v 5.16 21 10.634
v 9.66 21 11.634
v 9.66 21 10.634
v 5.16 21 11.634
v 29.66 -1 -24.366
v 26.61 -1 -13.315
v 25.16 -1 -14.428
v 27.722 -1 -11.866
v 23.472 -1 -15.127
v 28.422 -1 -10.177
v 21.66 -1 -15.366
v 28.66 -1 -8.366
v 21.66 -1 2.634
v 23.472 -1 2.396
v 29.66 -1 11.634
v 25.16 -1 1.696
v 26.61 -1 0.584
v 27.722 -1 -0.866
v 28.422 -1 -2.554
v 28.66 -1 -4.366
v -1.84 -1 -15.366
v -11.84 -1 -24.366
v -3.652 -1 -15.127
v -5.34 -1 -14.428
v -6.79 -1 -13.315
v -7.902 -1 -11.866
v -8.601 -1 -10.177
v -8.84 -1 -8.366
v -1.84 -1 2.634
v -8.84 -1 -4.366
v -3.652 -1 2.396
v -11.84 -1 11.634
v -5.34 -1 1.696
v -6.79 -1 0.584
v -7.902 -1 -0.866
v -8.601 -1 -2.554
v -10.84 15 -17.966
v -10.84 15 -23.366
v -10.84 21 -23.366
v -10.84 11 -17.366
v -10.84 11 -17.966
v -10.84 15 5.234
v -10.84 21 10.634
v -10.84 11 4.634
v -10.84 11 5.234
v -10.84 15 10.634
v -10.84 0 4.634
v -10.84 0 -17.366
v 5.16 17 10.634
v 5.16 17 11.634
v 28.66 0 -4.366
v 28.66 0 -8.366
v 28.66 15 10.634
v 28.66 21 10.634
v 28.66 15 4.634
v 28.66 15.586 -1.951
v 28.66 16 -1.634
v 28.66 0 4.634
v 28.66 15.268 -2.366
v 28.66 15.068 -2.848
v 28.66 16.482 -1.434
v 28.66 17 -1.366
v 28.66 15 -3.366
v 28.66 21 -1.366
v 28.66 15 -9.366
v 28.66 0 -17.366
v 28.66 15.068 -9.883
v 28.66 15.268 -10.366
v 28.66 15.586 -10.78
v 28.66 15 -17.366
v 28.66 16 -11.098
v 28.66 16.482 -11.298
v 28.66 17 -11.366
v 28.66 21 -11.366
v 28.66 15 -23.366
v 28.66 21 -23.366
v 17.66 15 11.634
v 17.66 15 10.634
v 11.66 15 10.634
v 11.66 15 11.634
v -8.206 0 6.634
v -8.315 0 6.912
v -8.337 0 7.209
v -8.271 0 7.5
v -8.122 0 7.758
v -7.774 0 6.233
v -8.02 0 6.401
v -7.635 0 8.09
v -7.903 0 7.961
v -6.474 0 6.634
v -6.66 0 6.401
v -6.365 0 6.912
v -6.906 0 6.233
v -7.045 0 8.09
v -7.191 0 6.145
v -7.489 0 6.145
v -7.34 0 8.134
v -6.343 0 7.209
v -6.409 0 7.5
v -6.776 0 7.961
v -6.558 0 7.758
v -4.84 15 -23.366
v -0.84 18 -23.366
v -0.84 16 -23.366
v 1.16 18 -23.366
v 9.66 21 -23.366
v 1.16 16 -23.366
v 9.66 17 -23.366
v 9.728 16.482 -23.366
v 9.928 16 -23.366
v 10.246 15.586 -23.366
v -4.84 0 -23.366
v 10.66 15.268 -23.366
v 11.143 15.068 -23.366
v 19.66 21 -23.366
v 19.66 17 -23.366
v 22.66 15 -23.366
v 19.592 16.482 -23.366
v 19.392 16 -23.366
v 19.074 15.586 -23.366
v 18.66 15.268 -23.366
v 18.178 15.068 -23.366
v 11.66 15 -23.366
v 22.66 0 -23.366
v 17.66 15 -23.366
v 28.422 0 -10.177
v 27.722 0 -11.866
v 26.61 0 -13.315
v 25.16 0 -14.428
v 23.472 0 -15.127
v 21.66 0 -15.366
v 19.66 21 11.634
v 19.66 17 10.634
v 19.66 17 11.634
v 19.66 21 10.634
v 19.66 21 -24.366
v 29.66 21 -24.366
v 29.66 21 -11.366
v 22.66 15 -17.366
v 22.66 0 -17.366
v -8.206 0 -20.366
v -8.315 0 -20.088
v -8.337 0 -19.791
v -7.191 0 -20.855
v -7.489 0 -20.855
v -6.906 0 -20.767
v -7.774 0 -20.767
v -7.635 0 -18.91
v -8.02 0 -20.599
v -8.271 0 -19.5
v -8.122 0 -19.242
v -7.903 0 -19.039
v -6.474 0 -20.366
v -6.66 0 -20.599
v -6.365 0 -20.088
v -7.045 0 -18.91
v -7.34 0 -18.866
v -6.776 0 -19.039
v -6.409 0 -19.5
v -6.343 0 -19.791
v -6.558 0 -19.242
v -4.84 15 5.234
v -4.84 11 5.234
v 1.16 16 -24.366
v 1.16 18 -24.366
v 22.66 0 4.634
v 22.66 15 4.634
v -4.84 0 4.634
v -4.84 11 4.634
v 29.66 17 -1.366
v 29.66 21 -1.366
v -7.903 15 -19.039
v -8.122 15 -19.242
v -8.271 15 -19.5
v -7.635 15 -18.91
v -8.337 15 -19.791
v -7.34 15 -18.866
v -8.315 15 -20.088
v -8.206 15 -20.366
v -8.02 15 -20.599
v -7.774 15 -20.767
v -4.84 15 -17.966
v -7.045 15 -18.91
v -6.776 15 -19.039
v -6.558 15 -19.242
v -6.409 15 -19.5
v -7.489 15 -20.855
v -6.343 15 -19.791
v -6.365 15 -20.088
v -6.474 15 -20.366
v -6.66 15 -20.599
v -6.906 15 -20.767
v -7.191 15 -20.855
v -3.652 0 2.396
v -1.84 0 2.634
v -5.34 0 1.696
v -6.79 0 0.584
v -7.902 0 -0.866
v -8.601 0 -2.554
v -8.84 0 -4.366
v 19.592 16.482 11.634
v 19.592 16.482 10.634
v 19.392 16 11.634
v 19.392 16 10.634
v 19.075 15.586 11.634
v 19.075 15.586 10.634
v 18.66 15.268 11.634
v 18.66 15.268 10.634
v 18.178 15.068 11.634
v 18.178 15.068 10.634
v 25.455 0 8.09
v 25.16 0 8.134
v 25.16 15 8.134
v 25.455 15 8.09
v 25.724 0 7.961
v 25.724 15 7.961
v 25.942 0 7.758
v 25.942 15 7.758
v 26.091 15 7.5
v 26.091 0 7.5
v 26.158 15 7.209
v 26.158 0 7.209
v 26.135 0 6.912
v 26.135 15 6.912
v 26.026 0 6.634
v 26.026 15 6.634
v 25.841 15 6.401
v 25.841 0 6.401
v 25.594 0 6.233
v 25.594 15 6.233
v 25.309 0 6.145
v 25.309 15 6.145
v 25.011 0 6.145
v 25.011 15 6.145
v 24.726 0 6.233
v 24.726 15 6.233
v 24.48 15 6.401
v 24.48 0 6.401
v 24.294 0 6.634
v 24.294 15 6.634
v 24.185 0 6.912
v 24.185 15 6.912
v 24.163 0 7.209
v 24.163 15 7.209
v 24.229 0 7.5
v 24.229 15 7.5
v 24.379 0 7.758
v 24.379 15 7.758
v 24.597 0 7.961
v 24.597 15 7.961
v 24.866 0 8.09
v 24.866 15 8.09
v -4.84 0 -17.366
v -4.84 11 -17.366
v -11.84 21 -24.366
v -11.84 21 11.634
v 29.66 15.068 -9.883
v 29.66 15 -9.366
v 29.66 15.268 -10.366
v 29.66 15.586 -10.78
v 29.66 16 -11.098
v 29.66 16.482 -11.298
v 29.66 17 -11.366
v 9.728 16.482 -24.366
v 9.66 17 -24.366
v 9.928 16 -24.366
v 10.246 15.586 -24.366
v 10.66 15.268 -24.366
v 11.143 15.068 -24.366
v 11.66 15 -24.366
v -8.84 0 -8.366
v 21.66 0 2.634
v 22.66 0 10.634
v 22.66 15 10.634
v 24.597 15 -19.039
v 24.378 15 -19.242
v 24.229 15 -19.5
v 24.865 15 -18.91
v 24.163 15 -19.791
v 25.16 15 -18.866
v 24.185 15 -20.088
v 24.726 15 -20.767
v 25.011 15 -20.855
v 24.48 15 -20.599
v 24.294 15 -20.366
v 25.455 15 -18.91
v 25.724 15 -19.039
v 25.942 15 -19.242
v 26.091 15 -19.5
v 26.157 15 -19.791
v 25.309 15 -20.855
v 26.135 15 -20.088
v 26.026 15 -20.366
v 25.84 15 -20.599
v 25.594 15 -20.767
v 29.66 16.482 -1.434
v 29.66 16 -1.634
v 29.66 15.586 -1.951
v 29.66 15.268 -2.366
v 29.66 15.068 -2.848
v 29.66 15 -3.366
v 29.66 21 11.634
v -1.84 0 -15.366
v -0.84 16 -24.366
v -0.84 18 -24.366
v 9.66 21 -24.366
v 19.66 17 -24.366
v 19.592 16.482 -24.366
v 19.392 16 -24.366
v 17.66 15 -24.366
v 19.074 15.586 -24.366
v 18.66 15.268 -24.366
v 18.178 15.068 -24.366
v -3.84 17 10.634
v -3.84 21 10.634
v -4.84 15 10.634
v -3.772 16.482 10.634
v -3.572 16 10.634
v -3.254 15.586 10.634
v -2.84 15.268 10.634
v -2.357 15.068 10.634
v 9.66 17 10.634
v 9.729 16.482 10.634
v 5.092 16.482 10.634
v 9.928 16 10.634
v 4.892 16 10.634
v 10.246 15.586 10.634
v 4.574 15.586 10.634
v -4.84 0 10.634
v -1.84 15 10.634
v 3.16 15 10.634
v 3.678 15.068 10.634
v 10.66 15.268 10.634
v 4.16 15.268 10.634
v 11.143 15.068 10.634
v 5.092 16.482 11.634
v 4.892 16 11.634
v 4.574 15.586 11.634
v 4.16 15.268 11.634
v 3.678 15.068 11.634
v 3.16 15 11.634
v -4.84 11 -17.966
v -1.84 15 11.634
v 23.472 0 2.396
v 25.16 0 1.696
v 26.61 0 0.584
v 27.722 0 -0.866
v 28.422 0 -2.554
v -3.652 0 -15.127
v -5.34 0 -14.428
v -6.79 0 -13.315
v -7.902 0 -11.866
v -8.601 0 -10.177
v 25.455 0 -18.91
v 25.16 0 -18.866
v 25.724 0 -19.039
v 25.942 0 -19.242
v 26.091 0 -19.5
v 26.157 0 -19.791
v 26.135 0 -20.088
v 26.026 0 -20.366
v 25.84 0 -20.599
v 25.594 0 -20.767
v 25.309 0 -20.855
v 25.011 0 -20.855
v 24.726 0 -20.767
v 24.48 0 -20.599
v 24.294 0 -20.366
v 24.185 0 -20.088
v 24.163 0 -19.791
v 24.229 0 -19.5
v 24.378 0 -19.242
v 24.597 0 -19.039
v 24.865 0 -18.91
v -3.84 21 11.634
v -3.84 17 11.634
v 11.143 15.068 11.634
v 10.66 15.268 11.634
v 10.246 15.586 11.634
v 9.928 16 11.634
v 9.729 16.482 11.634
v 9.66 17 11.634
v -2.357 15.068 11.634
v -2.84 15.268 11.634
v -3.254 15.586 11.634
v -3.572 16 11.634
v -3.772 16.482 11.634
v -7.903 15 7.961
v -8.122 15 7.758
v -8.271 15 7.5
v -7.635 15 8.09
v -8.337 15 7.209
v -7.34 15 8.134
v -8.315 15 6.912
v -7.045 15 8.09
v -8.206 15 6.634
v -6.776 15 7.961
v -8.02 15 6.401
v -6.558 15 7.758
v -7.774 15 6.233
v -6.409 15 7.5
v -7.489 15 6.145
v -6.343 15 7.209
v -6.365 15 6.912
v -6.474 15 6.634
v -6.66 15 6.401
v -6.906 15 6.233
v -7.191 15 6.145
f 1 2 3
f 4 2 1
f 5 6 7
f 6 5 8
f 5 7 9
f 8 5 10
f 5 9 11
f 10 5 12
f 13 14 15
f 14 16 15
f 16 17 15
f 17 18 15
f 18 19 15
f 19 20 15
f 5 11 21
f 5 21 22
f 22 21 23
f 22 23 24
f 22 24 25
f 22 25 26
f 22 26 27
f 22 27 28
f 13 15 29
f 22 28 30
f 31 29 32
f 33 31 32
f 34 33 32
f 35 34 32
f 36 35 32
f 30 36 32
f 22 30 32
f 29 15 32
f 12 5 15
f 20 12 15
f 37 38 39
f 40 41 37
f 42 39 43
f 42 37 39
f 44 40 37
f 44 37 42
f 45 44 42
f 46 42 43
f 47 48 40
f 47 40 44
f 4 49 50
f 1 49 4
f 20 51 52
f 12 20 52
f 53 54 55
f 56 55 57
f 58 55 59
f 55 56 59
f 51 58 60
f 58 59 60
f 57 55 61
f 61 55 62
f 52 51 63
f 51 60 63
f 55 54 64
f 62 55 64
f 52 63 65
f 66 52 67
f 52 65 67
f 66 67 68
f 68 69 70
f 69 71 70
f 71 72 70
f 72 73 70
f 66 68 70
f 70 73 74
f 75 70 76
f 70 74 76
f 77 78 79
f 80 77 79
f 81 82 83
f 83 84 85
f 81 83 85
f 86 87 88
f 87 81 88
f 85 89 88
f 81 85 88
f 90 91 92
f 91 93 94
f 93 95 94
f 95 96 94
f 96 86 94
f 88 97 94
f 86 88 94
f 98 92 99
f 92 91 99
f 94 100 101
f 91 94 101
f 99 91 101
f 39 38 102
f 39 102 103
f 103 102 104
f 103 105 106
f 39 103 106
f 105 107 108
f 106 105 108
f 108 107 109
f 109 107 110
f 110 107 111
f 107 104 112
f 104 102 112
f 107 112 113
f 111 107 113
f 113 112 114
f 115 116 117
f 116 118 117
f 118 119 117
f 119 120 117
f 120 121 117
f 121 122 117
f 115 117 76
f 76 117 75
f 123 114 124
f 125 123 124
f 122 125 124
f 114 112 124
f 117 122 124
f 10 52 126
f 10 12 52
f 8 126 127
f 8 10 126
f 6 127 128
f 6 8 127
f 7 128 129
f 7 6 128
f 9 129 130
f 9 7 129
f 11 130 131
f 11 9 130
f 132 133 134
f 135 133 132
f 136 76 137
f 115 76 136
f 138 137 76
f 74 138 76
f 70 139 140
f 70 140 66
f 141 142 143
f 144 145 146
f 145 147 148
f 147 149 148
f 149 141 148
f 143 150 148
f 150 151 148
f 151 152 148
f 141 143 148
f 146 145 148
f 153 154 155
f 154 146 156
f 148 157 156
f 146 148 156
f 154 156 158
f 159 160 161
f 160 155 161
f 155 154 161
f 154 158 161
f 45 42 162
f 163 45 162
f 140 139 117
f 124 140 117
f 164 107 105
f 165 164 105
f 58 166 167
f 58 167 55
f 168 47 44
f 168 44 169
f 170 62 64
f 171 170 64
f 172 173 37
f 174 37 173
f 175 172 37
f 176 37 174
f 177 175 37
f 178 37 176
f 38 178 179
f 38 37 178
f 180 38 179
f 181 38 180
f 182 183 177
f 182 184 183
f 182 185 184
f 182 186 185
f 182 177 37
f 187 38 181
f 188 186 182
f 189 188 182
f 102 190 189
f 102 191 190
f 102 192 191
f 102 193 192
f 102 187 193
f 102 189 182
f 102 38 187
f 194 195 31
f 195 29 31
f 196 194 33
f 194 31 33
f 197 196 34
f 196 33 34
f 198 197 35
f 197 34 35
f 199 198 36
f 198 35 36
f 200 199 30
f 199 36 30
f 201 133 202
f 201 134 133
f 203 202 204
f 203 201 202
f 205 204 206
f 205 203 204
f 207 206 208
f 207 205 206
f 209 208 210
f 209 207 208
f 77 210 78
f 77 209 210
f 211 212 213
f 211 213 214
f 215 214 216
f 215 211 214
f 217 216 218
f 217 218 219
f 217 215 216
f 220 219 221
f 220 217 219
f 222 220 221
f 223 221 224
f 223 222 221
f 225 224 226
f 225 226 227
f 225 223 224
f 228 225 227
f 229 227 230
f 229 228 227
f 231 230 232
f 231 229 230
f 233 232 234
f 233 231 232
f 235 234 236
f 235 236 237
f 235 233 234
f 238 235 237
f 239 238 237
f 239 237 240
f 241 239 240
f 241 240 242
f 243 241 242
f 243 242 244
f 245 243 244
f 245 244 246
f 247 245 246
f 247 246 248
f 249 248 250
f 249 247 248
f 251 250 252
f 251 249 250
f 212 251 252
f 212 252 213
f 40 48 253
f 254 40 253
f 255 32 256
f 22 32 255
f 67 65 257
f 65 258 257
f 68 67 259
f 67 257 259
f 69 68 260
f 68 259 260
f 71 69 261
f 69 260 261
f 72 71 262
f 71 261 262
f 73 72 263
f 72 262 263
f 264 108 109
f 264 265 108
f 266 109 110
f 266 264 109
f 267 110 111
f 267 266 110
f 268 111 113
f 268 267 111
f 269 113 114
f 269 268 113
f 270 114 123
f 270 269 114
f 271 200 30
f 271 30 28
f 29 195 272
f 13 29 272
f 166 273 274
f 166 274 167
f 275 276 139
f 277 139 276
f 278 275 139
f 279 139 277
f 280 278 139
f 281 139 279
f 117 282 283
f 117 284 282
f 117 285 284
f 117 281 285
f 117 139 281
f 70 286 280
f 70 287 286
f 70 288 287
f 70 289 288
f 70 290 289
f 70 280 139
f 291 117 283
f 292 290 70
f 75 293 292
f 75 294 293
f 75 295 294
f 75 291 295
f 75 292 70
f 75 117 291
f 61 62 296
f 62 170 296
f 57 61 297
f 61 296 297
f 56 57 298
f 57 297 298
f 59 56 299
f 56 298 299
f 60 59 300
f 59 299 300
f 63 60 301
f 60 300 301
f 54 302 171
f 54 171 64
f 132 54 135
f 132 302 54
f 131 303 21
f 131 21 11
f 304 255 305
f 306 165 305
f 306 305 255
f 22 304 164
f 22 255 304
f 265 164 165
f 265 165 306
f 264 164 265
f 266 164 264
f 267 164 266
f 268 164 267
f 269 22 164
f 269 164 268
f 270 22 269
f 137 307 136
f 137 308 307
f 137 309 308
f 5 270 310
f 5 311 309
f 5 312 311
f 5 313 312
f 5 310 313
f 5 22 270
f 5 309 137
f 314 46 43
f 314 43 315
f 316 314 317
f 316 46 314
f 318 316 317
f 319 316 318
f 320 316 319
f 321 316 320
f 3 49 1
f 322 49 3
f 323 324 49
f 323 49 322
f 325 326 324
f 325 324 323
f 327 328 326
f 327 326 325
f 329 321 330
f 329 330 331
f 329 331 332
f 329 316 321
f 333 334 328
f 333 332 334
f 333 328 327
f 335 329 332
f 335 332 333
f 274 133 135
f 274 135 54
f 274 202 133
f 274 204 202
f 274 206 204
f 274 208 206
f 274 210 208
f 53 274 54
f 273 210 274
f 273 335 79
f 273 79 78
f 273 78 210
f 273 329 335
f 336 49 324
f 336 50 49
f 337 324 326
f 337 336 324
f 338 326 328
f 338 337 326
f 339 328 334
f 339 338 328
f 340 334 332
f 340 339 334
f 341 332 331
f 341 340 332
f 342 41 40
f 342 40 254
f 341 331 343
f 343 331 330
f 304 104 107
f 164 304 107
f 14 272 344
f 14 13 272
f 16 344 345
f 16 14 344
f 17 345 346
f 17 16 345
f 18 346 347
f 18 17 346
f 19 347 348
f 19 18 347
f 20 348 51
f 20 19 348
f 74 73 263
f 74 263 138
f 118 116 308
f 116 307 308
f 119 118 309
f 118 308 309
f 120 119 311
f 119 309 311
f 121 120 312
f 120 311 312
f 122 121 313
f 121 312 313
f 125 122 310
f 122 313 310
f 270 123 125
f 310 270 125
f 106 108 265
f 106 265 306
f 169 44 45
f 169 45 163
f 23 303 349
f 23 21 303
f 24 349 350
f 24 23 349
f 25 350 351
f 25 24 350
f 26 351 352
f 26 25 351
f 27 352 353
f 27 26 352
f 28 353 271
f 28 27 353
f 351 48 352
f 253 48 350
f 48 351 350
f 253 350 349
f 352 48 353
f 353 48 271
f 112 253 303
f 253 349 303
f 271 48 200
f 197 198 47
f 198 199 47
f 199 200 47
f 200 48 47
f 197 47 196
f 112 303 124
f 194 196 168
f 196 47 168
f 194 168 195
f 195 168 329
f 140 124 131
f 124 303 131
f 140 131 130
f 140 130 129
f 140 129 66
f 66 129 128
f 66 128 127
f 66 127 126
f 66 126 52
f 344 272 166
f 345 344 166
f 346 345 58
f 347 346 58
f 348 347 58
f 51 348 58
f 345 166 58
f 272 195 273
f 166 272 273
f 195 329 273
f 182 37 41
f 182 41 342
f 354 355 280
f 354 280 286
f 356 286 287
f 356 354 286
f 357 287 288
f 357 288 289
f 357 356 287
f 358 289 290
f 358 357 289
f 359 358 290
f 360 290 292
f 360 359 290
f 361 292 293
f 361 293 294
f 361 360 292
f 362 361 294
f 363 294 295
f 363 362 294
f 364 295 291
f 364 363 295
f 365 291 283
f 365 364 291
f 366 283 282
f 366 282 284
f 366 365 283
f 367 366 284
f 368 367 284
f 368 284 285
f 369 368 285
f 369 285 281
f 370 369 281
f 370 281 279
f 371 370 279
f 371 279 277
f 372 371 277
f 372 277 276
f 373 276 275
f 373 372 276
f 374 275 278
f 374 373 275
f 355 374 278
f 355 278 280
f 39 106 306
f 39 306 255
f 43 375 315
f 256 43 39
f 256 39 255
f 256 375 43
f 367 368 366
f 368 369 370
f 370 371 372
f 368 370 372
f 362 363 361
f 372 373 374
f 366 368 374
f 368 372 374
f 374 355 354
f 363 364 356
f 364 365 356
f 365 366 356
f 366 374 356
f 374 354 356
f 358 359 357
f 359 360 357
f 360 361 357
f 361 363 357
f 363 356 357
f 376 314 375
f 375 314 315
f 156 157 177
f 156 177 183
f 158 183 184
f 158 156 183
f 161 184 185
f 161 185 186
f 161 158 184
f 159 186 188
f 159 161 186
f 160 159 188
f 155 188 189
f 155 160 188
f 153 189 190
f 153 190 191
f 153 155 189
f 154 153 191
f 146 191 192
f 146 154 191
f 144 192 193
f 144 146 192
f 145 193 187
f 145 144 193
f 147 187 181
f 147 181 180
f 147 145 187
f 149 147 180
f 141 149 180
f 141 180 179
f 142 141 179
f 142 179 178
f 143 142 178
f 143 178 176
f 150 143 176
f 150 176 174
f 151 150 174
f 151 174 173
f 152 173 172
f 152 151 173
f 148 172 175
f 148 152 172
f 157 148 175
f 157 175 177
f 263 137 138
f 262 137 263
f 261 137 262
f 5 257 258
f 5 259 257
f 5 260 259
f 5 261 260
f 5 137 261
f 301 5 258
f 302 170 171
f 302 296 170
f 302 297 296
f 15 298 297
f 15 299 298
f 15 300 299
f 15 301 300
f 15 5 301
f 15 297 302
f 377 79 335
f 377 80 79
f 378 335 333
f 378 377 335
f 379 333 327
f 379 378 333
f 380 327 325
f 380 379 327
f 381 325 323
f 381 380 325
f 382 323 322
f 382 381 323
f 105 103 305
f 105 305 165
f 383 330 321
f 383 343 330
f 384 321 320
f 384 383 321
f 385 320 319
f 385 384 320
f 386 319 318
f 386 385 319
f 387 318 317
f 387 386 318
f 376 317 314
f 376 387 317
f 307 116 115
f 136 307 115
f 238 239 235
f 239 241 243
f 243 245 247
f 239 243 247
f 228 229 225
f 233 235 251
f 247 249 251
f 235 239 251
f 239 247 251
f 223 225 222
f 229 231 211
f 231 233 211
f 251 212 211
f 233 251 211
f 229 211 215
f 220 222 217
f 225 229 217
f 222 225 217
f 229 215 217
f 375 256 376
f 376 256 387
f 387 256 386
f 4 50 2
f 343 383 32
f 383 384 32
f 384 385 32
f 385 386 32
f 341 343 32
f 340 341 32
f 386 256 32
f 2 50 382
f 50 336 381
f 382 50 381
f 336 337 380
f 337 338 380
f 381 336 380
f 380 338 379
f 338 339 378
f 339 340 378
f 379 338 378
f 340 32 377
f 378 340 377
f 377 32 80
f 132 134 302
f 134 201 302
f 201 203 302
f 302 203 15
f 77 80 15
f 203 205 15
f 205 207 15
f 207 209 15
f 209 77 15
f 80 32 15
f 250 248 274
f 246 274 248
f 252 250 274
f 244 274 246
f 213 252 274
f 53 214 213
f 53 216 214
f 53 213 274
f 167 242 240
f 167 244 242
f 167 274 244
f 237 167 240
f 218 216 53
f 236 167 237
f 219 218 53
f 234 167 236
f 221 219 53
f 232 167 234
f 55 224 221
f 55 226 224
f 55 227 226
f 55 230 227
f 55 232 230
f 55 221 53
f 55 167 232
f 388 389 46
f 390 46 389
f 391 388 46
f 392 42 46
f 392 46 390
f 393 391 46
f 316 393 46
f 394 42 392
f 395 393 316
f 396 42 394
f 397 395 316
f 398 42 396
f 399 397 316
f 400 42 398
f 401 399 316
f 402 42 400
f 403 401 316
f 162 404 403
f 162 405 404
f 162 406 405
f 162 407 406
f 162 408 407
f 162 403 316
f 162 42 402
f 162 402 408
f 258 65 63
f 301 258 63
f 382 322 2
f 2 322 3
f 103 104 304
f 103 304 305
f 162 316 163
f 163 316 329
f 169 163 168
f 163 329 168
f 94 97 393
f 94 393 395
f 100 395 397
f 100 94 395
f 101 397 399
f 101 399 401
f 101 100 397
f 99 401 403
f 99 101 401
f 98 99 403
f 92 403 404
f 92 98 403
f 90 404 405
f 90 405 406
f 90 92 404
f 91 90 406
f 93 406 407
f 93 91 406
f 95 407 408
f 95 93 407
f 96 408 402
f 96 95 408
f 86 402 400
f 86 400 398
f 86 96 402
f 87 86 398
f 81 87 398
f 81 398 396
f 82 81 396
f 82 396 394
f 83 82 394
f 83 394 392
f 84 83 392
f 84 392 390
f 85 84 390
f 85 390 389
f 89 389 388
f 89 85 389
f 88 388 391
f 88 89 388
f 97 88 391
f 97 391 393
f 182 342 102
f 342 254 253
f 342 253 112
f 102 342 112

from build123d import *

# Parameters (mm, degrees)
SKETCH1_W             = 6
SKETCH1_H             = 6
SKETCH1_R             = 1
BOSS_EXTRUDE1_DEPTH   = 15
BOSS_EXTRUDE1_2_DEPTH = 15
BOSS_EXTRUDE1_3_DEPTH = 15
BOSS_EXTRUDE1_4_DEPTH = 15
SKETCH2_W             = 39.5
SKETCH2_H             = 33.999999999
BOSS_EXTRUDE2_DEPTH   = 1
SKETCH3_W             = 39.5
SKETCH3_H             = 33.999999999
BOSS_EXTRUDE3_DEPTH   = 22
SKETCH4_W             = 37.5
SKETCH4_H             = 17.999999999
CUT_EXTRUDE1_DEPTH    = 22
FILLET1_R             = 7
SKETCH7_W             = 6
SKETCH7_H             = 0.6
CUT_EXTRUDE2_DEPTH    = 4
SKETCH8_W             = 9.999999999
SKETCH8_H             = 6
CUT_EXTRUDE3_DEPTH    = 4
FILLET2_R             = 2
SKETCH9_W             = 10
SKETCH9_H             = 6
SKETCH9_W_2           = 9
CUT_EXTRUDE4_DEPTH    = 4
FILLET3_R             = 2
SKETCH10_W            = 10
SKETCH10_H            = 6
CUT_EXTRUDE5_DEPTH    = 4
FILLET4_R             = 2
SKETCH11_W            = 2
SKETCH11_H            = 2
CUT_EXTRUDE6_DEPTH    = 4


with BuildPart() as part:
    # Sketch1 → Boss-Extrude1 (new body)
    with BuildSketch(Plane(origin=(0, 0, 0), x_dir=(1, 0, 0), z_dir=(0, 1, 0))):
        with Locations((-7.839776389, 20.365683815)):
            Rectangle(SKETCH1_W, SKETCH1_H)
        with Locations(Location((-7.339776389, 19.865683815, 0), (0, 0, 270))):
            Circle(SKETCH1_R, mode=Mode.SUBTRACT)
    extrude(amount=BOSS_EXTRUDE1_DEPTH)



with BuildPart() as body_2:
    # Sketch1 → Boss-Extrude1 2 (new body)
    with BuildSketch(Plane(origin=(0, 0, 0), x_dir=(1, 0, 0), z_dir=(0, 1, 0))):
        with Locations((25.660223611, 20.365683814)):
            Rectangle(SKETCH1_W, SKETCH1_H)
        with Locations(Location((25.160223611, 19.865683814, 0), (0, 0, 270))):
            Circle(SKETCH1_R, mode=Mode.SUBTRACT)
    extrude(amount=BOSS_EXTRUDE1_2_DEPTH)


with BuildPart() as body_3:
    # Sketch1 → Boss-Extrude1 3 (new body)
    with BuildSketch(Plane(origin=(0, 0, 0), x_dir=(1, 0, 0), z_dir=(0, 1, 0))):
        with Locations((-7.839776389, -7.634316185)):
            Rectangle(SKETCH1_W, SKETCH1_H)
        with Locations(Location((-7.339776389, -7.134316185, 0), (0, 0, 270))):
            Circle(SKETCH1_R, mode=Mode.SUBTRACT)
    extrude(amount=BOSS_EXTRUDE1_3_DEPTH)


with BuildPart() as body_4:
    # Sketch1 → Boss-Extrude1 4 (new body)
    with BuildSketch(Plane(origin=(0, 0, 0), x_dir=(1, 0, 0), z_dir=(0, 1, 0))):
        with Locations((25.660371549, -7.634316185)):
            Rectangle(SKETCH1_W, SKETCH1_H)
        with Locations(Location((25.160371549, -7.134316185, 0), (0, 0, 270))):
            Circle(SKETCH1_R, mode=Mode.SUBTRACT)
    extrude(amount=BOSS_EXTRUDE1_4_DEPTH)


with BuildPart() as part_1:
    add(part.part)

    add(body_2.part)  # Boss-Extrude2 merges body 2

    add(body_3.part)  # Boss-Extrude2 merges body 3

    add(body_4.part)  # Boss-Extrude2 merges body 4
    # Sketch2 → Boss-Extrude2 (add)
    with BuildSketch(Plane.XZ):
        with Locations((8.910223611, -6.365683814)):
            Rectangle(SKETCH2_W, SKETCH2_H)
    extrude(amount=BOSS_EXTRUDE2_DEPTH)

    # Sketch3 → Boss-Extrude3 (add)
    with BuildSketch(Plane.XZ.offset(1)):
        Polygon((-11.839776389, 9.730248223), (-11.839776389, 11.634316185), (29.660223611, 11.634316185), (29.660223611, 9.730248223), (29.660223611, -24.365683814), (28.803720569, -24.365683814), (-10.696279431, -24.365683814), (-11.839776389, -24.365683814), align=None)
        with Locations((8.910223611, -6.365683814)):
            Rectangle(SKETCH3_W, SKETCH3_H, mode=Mode.SUBTRACT)
    extrude(amount=-BOSS_EXTRUDE3_DEPTH)

    # Sketch4 → Cut-Extrude1 (cut)
    with BuildSketch(Plane(origin=(0, 0, 0), x_dir=(1, 0, 0), z_dir=(0, 1, 0))):
        with Locations((9.910223611, 6.365683815)):
            Rectangle(SKETCH4_W, SKETCH4_H)
    extrude(amount=-CUT_EXTRUDE1_DEPTH, mode=Mode.SUBTRACT)

    # Fillet1
    fillet1_edges = [part_1.edges().sort_by_distance(p)[0] for p in [
        (-8.839776389, -0.5, 2.634316185),
        (-8.839776389, -0.5, -15.365683814),
        (28.660223611, -0.5, -15.365683814),
        (28.660223611, -0.5, 2.634316185),
    ]]
    fillet(fillet1_edges, radius=FILLET1_R)

    # Sketch7 → Cut-Extrude2 (cut)
    with BuildSketch(Plane(origin=(0, 15, 0), x_dir=(1, 0, 0), z_dir=(0, 1, 0))):
        with Locations((-7.839776389, 17.665683815)):
            Rectangle(SKETCH7_W, SKETCH7_H)
        with Locations((-7.839776389, -4.934316185)):
            Rectangle(SKETCH7_W, SKETCH7_H)
    extrude(amount=-CUT_EXTRUDE2_DEPTH, mode=Mode.SUBTRACT)

    # Sketch8 → Cut-Extrude3 (cut)
    with BuildSketch(Plane.ZY.offset(-28.660223611)):
        with Locations((-6.365683815, 18)):
            Rectangle(SKETCH8_W, SKETCH8_H)
    extrude(amount=-CUT_EXTRUDE3_DEPTH, mode=Mode.SUBTRACT)

    # Fillet2
    fillet2_edges = [part_1.edges().sort_by_distance(p)[0] for p in [
        (29.160223611, 15, -11.365683814),
        (29.160223611, 15, -1.365683815),
    ]]
    fillet(fillet2_edges, radius=FILLET2_R)

    # Sketch9 → Cut-Extrude4 (cut)
    with BuildSketch(Plane(origin=(0, 0, 10.634316185), x_dir=(-1, 0, 0), z_dir=(0, 0, -1))):
        with Locations((-14.660371549, 18)):
            Rectangle(SKETCH9_W, SKETCH9_H)
        with Locations((-0.660223611, 18)):
            Rectangle(SKETCH9_W_2, SKETCH9_H)
    extrude(amount=-CUT_EXTRUDE4_DEPTH, mode=Mode.SUBTRACT)

    # Fillet3
    fillet3_edges = [part_1.edges().sort_by_distance(p)[0] for p in [
        (19.660371549, 15, 11.134316185),
        (9.660371549, 15, 11.134316185),
        (5.160223611, 15, 11.134316185),
        (-3.839776389, 15, 11.134316185),
    ]]
    fillet(fillet3_edges, radius=FILLET3_R)

    # Sketch10 → Cut-Extrude5 (cut)
    with BuildSketch(Plane.XY.offset(-23.365683814)):
        with Locations((14.660223611, 18)):
            Rectangle(SKETCH10_W, SKETCH10_H)
    extrude(amount=-CUT_EXTRUDE5_DEPTH, mode=Mode.SUBTRACT)

    # Fillet4
    fillet4_edges = [part_1.edges().sort_by_distance(p)[0] for p in [
        (19.660223611, 15, -23.865683814),
        (9.660223611, 15, -23.865683814),
    ]]
    fillet(fillet4_edges, radius=FILLET4_R)

    # Sketch11 → Cut-Extrude6 (cut)
    with BuildSketch(Plane.XY.offset(-23.365683814)):
        with Locations((0.160223611, 17)):
            Rectangle(SKETCH11_W, SKETCH11_H)
    extrude(amount=-CUT_EXTRUDE6_DEPTH, mode=Mode.SUBTRACT)


solid = part_1.part
